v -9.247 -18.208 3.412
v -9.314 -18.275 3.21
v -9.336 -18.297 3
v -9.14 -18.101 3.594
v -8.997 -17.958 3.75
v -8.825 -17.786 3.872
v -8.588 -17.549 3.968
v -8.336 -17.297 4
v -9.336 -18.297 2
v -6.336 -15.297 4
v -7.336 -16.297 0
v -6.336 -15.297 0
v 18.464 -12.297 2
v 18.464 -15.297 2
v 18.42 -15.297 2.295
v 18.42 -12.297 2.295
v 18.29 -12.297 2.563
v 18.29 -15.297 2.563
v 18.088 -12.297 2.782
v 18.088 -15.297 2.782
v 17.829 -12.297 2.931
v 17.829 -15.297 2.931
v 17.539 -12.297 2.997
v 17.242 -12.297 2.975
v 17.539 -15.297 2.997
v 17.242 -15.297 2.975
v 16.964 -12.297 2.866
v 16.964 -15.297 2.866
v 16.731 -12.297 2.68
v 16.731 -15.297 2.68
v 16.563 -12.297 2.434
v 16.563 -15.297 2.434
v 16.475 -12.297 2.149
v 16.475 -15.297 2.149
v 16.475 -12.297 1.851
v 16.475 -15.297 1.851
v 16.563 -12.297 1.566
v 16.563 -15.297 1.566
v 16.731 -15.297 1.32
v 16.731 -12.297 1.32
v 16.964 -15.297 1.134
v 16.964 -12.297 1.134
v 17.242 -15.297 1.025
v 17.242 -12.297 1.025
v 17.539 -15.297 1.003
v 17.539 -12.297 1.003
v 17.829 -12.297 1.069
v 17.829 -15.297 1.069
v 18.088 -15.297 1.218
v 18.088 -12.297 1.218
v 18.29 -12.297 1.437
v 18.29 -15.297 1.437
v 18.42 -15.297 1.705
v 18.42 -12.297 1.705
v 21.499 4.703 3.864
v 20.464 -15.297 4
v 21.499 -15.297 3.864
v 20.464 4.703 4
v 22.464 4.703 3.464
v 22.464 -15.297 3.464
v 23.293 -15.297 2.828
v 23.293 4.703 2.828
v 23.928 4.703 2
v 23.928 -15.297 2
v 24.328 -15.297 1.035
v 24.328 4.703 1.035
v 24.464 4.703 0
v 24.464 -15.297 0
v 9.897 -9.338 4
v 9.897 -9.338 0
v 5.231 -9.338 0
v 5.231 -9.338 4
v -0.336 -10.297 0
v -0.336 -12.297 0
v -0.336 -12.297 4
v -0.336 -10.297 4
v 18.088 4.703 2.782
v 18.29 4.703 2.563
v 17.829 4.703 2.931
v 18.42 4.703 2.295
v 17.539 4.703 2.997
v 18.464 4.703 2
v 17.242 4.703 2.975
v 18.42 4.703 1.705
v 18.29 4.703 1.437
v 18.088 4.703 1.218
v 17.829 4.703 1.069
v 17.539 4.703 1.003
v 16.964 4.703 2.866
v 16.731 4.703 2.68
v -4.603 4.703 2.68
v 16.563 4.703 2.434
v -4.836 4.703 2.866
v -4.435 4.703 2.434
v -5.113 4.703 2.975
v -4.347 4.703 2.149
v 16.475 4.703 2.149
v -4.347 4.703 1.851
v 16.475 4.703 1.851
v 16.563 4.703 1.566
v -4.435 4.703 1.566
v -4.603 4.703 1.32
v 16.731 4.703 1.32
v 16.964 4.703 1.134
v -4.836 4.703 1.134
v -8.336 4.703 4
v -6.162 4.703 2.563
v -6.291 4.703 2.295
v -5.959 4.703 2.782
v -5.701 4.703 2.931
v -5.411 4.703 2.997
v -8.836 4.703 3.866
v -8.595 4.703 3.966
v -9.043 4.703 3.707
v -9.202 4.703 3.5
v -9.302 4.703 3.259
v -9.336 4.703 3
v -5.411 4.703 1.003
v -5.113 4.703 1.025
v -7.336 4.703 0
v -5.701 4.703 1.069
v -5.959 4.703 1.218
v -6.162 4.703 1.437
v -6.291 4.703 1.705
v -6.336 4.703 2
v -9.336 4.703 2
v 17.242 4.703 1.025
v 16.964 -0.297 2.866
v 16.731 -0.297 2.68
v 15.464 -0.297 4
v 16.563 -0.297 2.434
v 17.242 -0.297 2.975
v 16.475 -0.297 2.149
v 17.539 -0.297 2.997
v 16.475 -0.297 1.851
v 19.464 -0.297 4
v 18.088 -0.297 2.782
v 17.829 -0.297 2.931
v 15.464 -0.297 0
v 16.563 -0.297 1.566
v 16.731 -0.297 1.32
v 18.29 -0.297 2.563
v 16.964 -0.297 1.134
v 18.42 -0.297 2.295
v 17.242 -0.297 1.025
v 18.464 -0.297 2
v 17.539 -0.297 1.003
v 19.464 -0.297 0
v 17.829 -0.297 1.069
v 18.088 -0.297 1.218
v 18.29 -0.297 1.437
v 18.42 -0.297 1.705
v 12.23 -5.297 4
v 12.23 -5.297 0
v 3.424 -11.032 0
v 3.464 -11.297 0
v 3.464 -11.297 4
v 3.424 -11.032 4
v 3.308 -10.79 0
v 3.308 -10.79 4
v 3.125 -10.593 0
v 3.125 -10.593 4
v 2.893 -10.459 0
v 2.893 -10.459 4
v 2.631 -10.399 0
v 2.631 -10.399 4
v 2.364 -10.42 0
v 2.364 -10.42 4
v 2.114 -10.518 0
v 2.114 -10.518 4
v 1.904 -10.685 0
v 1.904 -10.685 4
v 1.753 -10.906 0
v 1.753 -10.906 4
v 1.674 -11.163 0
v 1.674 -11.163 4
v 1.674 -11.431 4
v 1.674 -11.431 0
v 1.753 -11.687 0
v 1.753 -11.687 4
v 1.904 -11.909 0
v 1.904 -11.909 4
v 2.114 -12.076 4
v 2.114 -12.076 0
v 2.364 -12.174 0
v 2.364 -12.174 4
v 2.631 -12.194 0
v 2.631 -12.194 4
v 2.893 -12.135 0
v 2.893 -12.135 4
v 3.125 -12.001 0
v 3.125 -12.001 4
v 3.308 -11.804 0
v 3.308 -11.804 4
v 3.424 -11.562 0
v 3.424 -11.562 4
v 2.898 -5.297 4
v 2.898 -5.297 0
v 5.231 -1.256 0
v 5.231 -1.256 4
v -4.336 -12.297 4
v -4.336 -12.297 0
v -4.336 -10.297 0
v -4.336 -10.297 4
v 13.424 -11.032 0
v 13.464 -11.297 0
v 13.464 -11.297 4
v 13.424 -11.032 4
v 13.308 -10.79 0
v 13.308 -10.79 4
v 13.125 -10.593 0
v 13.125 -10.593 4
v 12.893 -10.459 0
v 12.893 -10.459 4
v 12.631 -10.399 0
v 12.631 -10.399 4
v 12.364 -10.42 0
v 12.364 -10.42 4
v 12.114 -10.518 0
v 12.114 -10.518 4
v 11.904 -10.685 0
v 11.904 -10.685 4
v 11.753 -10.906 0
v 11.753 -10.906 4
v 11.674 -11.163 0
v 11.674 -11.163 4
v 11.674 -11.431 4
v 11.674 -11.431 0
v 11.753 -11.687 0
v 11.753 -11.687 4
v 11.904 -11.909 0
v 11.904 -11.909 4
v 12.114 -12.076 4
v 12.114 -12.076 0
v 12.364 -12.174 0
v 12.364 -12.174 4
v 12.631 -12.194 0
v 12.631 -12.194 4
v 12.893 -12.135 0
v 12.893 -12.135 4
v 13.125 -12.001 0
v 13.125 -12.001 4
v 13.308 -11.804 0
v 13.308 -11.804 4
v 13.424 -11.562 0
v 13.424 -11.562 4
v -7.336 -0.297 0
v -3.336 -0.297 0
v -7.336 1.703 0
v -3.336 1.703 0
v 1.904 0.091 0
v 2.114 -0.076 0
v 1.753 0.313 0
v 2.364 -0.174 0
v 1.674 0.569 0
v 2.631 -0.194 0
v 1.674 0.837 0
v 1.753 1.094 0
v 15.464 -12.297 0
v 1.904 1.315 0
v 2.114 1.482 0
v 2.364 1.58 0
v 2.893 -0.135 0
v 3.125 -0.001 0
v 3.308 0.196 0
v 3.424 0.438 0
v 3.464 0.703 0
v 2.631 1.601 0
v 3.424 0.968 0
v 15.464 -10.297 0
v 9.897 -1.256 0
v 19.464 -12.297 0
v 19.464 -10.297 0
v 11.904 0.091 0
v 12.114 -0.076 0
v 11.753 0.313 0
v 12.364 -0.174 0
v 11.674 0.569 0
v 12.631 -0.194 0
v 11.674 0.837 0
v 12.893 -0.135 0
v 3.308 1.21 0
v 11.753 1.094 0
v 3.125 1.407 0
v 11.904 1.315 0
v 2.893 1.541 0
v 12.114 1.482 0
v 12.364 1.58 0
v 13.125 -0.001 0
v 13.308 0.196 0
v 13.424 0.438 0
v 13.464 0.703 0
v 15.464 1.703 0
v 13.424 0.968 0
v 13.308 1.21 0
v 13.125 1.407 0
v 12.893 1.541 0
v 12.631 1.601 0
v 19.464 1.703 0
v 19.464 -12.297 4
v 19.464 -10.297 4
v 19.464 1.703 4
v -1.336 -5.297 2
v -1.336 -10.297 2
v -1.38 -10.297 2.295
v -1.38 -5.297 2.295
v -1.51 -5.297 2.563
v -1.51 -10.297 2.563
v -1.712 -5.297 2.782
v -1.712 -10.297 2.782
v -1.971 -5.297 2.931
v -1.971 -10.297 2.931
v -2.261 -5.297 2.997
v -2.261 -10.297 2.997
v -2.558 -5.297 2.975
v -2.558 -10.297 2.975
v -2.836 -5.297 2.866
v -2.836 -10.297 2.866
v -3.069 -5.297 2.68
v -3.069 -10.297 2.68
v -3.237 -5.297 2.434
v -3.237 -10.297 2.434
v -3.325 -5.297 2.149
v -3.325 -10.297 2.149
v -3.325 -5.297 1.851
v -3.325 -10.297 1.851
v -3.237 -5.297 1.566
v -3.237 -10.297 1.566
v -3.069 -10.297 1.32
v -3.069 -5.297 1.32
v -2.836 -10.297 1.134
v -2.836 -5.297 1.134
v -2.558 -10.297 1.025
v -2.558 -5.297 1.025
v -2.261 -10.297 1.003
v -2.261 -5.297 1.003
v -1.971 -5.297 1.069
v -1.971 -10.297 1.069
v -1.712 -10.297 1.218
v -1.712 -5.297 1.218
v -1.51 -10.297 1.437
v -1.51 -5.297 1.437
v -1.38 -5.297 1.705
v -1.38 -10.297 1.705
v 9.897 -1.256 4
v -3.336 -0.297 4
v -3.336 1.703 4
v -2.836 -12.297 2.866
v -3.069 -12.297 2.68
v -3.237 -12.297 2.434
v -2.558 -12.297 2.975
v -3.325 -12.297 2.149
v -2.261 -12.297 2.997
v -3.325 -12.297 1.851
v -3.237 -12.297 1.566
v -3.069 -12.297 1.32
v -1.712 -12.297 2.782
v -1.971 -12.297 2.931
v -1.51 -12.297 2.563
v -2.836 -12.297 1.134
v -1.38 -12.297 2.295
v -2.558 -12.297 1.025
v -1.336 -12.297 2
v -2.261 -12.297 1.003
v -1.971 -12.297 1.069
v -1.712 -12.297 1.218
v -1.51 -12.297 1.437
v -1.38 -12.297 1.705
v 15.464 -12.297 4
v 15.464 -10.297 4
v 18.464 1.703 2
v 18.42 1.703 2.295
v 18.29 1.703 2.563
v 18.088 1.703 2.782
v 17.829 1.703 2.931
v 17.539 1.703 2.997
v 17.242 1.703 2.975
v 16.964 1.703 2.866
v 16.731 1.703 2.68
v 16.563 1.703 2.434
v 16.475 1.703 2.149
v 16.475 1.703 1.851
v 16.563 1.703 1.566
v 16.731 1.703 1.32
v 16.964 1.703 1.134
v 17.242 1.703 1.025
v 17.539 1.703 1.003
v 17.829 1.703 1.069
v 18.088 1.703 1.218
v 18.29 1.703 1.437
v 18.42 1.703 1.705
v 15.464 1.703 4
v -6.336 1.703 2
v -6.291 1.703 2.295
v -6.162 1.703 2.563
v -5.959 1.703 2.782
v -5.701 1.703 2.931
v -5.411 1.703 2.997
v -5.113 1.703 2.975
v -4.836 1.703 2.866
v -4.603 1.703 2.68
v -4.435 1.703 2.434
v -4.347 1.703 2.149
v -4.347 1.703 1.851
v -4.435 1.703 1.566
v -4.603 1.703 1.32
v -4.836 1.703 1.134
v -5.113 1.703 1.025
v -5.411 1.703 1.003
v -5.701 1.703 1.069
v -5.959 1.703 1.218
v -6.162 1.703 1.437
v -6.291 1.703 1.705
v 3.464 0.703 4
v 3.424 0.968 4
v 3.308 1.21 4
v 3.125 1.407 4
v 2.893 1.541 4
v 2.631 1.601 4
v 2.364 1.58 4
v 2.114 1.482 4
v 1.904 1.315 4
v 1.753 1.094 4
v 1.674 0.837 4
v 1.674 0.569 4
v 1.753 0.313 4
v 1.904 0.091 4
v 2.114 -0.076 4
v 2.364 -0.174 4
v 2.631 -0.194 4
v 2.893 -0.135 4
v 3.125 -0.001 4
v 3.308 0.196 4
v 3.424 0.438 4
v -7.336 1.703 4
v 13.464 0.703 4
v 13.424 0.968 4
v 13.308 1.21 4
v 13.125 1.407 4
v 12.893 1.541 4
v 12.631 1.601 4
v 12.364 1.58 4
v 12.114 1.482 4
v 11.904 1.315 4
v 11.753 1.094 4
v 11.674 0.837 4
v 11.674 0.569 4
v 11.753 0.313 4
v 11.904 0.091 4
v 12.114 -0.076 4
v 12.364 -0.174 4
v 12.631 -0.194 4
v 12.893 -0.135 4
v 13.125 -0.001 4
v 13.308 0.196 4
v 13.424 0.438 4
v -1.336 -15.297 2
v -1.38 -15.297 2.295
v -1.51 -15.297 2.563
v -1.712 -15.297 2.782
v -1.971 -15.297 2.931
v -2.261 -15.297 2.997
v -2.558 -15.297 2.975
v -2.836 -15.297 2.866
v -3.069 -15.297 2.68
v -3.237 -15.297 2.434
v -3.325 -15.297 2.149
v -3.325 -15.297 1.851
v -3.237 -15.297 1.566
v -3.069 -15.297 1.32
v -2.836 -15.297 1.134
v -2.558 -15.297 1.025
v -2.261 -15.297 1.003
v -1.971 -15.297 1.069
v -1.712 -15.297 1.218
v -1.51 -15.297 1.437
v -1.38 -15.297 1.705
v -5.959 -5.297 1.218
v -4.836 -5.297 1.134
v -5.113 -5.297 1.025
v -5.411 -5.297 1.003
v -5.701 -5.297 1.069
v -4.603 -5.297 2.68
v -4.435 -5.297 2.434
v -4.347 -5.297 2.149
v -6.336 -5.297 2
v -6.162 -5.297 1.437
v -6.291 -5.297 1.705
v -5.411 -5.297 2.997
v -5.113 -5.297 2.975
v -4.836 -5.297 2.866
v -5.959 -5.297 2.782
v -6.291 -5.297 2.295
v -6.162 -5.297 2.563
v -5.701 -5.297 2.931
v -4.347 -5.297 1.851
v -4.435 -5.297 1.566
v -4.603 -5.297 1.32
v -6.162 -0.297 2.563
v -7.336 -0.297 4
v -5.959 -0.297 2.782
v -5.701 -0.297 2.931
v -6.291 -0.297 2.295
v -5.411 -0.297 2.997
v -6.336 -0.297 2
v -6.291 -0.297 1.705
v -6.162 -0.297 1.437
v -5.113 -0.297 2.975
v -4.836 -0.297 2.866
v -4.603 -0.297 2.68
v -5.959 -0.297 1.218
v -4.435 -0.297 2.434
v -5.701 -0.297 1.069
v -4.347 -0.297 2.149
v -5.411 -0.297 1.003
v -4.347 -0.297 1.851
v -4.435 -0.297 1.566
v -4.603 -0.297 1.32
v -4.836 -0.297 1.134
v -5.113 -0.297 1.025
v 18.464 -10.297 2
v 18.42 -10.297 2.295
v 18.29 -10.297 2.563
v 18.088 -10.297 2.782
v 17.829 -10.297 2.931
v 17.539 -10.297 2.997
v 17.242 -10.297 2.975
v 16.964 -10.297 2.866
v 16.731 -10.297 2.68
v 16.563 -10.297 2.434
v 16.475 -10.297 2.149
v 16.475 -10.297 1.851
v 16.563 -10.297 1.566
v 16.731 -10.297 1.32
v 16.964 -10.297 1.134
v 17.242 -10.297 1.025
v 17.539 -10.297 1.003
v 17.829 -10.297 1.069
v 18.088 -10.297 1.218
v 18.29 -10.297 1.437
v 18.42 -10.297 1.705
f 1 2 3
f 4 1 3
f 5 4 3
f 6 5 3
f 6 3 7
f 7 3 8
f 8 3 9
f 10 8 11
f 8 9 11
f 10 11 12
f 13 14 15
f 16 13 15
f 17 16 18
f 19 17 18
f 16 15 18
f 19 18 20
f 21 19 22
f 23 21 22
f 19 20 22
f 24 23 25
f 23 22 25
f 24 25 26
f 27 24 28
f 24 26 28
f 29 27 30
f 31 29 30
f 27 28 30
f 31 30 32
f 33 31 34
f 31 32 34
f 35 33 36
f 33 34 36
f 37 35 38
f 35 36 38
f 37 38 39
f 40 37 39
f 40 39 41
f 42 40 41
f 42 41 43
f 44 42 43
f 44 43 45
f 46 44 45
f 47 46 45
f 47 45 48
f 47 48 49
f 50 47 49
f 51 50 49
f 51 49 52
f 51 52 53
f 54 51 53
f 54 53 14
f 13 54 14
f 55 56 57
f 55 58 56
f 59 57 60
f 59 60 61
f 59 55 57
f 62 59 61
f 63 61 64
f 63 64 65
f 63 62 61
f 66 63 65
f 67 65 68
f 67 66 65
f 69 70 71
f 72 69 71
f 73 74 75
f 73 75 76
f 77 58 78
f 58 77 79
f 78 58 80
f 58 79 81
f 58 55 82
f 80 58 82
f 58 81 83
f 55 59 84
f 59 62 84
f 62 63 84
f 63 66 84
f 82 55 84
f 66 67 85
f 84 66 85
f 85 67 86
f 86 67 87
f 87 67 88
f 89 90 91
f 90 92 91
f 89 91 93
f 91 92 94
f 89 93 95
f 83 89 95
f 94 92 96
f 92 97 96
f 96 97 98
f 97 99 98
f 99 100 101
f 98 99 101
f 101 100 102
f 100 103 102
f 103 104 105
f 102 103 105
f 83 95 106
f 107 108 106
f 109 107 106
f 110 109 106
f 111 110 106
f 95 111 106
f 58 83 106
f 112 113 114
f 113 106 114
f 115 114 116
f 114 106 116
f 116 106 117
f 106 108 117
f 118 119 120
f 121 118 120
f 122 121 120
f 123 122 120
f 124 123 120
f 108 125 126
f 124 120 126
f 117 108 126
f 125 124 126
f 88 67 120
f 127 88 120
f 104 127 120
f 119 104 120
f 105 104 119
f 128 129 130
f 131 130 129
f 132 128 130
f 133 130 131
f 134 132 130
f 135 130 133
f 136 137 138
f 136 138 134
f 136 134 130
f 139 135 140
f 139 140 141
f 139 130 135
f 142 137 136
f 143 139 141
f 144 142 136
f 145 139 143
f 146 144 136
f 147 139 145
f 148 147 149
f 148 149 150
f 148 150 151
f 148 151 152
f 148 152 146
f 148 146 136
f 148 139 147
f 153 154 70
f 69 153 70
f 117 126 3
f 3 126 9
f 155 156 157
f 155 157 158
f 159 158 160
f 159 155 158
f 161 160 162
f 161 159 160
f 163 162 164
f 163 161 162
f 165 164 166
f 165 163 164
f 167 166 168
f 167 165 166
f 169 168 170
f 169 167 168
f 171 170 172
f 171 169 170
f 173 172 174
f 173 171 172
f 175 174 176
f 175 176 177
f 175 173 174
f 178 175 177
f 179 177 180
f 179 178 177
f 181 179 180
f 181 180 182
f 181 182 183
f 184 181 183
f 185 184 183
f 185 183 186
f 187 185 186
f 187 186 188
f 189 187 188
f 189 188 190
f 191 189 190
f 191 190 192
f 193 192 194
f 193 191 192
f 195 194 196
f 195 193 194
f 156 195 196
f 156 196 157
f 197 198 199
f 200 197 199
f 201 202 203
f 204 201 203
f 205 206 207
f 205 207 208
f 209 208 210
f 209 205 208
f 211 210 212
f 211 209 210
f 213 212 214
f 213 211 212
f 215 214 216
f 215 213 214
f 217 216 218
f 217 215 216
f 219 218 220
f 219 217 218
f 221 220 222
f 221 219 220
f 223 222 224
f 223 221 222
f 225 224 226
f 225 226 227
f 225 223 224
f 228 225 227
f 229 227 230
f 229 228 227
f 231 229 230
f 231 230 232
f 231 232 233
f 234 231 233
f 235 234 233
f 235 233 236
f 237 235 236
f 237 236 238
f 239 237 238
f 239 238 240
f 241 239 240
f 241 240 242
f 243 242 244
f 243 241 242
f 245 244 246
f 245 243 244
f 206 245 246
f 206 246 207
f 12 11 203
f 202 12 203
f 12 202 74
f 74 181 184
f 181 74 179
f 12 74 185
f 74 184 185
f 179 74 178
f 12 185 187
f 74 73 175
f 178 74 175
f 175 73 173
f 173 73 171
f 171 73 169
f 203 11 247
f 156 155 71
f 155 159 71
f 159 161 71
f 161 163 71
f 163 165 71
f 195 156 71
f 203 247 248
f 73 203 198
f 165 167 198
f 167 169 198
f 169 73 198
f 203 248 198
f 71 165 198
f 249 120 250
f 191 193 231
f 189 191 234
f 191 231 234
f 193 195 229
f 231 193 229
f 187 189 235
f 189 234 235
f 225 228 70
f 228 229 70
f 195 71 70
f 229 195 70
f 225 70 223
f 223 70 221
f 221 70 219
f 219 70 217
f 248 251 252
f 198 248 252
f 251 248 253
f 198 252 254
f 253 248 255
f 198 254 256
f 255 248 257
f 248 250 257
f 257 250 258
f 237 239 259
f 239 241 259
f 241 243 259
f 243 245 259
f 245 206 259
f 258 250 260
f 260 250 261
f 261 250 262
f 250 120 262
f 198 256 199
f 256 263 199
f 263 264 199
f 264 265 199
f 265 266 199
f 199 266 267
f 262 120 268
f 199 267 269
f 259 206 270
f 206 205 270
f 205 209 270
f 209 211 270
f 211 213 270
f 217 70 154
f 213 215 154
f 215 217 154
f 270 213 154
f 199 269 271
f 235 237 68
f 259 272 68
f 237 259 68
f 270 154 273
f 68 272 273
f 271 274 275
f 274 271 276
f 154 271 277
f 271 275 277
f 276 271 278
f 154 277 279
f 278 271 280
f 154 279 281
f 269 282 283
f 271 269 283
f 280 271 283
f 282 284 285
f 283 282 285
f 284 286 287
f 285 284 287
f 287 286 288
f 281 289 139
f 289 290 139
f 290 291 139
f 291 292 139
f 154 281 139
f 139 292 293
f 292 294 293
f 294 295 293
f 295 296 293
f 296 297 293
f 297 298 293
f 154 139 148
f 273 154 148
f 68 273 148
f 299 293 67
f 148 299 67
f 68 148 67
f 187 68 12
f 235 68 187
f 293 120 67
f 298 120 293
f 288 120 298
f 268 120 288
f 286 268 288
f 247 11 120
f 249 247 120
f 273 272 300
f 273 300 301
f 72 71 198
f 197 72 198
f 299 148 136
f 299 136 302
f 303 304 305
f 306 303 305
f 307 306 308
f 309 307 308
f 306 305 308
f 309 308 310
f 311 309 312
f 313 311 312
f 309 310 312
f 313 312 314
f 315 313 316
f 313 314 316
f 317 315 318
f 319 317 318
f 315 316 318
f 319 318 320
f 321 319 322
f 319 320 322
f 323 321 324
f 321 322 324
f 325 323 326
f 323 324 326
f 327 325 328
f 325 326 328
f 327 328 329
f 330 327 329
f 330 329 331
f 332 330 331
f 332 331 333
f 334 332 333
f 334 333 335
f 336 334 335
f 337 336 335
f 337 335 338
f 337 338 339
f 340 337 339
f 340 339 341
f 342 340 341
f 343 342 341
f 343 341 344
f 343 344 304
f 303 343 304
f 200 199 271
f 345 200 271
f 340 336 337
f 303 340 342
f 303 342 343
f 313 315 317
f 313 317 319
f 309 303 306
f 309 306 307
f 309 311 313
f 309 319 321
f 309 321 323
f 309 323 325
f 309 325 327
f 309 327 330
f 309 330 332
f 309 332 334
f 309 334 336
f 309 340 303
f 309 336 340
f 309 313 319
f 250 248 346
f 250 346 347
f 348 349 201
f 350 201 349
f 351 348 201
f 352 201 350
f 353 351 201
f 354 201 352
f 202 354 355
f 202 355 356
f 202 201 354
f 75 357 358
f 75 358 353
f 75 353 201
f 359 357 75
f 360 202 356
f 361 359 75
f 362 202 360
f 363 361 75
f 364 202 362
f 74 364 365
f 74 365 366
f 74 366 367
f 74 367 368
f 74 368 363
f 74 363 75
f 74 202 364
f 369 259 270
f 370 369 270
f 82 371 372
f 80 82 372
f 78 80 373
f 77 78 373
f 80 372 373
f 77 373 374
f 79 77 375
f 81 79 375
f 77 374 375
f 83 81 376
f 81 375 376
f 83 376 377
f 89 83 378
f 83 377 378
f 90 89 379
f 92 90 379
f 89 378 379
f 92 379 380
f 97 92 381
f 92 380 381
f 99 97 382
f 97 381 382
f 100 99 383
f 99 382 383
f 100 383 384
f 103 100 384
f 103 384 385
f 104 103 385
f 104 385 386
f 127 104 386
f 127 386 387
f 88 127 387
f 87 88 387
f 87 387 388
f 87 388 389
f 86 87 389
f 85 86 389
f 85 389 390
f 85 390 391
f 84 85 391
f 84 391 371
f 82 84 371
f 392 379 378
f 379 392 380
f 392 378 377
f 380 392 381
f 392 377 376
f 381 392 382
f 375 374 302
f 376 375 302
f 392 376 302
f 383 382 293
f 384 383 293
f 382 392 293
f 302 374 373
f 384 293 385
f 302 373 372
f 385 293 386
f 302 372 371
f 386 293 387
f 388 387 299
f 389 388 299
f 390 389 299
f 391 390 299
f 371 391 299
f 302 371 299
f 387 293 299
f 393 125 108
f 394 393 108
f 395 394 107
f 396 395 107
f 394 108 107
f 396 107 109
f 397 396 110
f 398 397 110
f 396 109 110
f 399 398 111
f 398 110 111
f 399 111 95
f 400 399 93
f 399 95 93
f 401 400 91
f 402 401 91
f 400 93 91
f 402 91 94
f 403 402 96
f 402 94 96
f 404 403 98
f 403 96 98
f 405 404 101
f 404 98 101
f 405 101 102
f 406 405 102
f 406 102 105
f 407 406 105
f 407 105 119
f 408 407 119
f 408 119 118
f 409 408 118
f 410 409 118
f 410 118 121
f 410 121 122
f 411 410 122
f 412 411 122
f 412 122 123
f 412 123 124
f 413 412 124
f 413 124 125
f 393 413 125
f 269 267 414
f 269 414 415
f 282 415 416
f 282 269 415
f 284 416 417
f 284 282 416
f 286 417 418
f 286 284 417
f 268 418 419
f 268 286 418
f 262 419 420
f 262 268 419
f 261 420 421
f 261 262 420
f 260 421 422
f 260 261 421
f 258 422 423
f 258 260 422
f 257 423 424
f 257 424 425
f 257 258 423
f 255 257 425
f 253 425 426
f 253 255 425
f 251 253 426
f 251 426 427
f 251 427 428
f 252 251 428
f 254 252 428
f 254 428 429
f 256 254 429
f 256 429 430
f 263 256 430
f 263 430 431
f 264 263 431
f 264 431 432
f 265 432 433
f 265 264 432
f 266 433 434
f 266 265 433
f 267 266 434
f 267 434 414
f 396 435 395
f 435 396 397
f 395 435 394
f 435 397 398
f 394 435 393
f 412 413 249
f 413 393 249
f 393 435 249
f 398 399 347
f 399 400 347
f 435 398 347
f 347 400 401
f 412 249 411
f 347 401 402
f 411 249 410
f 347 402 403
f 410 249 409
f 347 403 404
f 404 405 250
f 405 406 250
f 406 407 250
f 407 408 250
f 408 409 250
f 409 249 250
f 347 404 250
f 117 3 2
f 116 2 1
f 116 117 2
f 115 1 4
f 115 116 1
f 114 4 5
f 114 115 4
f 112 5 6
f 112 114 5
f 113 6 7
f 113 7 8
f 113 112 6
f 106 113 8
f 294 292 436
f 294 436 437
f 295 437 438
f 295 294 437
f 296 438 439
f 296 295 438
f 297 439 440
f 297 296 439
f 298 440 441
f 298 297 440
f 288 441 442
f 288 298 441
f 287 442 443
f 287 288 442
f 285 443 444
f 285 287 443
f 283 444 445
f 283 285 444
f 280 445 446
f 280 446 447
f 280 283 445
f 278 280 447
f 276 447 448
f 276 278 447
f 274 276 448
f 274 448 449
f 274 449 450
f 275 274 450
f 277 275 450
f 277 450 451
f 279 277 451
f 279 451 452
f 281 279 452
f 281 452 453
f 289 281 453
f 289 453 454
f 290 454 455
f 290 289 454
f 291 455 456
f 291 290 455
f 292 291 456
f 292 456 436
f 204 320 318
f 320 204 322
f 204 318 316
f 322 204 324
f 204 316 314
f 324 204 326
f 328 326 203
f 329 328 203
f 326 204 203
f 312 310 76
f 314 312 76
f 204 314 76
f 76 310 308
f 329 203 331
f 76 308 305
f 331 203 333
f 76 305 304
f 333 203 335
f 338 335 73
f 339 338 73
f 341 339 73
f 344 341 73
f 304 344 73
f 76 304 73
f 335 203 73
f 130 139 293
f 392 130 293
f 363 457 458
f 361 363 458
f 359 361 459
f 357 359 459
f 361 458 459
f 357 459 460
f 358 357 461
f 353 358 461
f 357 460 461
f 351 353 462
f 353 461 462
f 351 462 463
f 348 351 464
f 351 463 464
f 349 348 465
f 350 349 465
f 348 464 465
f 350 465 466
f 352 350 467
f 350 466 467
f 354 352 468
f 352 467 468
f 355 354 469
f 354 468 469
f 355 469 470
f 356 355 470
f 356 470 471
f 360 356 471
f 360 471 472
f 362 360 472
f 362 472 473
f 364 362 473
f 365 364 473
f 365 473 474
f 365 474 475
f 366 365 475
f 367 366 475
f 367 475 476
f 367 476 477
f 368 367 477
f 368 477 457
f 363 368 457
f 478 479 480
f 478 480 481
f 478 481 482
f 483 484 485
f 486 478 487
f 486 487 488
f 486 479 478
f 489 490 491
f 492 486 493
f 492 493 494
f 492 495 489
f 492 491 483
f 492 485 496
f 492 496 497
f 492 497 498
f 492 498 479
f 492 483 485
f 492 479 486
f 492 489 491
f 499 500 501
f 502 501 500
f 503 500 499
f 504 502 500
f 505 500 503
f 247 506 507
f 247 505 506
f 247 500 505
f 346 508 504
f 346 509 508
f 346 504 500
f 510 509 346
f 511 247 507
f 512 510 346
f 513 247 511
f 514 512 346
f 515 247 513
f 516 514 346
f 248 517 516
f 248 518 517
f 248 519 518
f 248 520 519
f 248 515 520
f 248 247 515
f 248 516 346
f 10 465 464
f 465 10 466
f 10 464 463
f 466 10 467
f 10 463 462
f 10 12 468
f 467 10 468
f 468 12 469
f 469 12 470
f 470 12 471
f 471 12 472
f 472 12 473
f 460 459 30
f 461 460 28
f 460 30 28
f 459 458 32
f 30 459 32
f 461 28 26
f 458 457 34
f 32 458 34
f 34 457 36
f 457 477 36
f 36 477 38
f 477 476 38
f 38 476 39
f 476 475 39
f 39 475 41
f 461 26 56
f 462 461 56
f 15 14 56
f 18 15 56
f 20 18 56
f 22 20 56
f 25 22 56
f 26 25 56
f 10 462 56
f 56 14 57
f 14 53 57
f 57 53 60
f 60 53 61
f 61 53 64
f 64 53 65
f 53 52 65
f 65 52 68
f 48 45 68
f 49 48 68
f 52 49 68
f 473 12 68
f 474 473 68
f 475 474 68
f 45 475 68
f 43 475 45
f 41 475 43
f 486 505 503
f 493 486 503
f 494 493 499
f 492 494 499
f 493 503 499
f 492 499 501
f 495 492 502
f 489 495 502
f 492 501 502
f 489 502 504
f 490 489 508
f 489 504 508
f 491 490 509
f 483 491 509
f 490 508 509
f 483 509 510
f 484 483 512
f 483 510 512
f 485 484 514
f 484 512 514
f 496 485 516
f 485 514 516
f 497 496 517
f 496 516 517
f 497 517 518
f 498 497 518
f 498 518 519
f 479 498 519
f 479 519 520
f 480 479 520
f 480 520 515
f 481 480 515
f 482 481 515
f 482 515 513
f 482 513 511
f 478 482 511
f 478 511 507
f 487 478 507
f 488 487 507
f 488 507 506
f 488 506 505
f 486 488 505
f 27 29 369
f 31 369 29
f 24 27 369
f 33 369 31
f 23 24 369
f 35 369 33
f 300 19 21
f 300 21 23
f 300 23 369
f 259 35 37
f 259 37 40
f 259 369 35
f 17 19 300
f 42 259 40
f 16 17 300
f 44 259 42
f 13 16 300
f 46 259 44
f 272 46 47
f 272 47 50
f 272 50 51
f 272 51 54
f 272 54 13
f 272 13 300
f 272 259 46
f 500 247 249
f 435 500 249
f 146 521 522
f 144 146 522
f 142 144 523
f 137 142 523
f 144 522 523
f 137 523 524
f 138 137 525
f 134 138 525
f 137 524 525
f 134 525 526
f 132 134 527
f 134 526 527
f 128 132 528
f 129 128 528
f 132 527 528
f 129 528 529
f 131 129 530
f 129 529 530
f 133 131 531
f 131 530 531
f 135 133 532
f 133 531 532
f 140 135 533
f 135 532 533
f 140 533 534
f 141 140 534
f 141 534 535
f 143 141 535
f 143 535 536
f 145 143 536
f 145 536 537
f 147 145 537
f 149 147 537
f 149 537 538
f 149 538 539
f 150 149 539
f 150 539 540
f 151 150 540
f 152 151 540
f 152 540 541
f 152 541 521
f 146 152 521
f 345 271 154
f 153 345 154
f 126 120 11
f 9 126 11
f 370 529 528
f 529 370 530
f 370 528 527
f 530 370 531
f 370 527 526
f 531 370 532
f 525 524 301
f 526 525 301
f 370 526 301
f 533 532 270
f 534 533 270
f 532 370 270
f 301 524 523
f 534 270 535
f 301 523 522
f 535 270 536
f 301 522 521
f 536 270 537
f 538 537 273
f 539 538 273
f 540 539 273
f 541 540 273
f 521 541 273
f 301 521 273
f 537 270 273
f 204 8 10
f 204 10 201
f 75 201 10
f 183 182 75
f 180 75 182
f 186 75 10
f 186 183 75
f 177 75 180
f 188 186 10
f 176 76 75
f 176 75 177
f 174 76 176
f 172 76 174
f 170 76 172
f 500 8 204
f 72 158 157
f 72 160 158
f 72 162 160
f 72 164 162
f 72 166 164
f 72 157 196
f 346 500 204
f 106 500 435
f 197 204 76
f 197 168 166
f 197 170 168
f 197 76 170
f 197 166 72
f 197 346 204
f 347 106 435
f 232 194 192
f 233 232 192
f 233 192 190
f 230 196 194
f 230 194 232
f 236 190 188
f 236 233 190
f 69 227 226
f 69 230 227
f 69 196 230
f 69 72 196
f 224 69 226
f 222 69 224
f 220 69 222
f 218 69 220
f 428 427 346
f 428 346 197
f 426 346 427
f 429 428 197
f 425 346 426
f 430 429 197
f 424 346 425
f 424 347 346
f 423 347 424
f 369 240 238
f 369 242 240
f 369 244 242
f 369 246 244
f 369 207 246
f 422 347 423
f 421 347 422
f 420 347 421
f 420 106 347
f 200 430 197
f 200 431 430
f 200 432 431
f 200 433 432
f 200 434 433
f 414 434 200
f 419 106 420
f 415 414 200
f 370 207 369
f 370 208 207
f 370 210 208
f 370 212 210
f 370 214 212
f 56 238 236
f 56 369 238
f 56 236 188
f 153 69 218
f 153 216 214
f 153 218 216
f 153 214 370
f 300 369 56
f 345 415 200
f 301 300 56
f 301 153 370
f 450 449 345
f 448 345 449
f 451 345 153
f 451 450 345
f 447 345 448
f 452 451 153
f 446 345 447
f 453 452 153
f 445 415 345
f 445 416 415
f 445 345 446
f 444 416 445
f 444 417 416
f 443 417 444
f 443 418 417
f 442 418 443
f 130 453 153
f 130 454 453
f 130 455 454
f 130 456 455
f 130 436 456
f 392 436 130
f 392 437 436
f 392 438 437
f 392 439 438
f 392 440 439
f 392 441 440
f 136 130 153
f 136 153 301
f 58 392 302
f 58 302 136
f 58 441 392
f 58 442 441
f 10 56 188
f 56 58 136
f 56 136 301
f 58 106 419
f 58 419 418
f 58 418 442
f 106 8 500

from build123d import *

# Parameters (mm, degrees)
SKETCH1_W           = 4
SKETCH1_H           = 2
SKETCH1_R           = 0.9
BOSS_EXTRUDE1_DEPTH = 4
SKETCH3_R           = 1
CUT_EXTRUDE1_DEPTH  = 20
SKETCH3_3_R         = 1
CUT_EXTRUDE2_DEPTH  = 10
SKETCH5_R           = 1
CUT_EXTRUDE3_DEPTH  = 10
CHAMFER2_SIZE       = 2
FILLET2_R           = 1
FILLET3_R           = 4


with BuildPart() as part:
    # Sketch1 → Boss-Extrude1 (new body)
    # profile 1 of 2: a face of its own
    with BuildSketch(Plane.XY):
        Polygon((-9.335901083, -15.296943817), (-6.335901083, -15.296943817), (24.464098917, -15.296943817), (24.464098917, 4.703056183), (-9.335901083, 4.703056183), align=None)
        with Locations((-2.335901083, -11.296943817)):
            Rectangle(SKETCH1_W, SKETCH1_H, mode=Mode.SUBTRACT)
        with Locations((2.564098917, -11.296943817)):
            Circle(SKETCH1_R, mode=Mode.SUBTRACT)
        with Locations((12.564098917, -11.296943817)):
            Circle(SKETCH1_R, mode=Mode.SUBTRACT)
        with Locations((17.464098917, -11.296943817)):
            Rectangle(SKETCH1_W, SKETCH1_H, mode=Mode.SUBTRACT)
        with Locations((-5.335901083, 0.703056183)):
            Rectangle(SKETCH1_W, SKETCH1_H, mode=Mode.SUBTRACT)
        with Locations((2.564098917, 0.703056183)):
            Circle(SKETCH1_R, mode=Mode.SUBTRACT)
        Polygon((9.896924586, -1.256371234), (12.229750255, -5.296943817), (9.896924586, -9.337516401), (5.231273248, -9.337516401), (2.898447579, -5.296943817), (5.231273248, -1.256371234), align=None, mode=Mode.SUBTRACT)
        with Locations((12.564098917, 0.703056183)):
            Circle(SKETCH1_R, mode=Mode.SUBTRACT)
        with Locations((17.464098917, 0.703056183)):
            Rectangle(SKETCH1_W, SKETCH1_H, mode=Mode.SUBTRACT)
    # profile 2 of 2: a face of its own
    with BuildSketch(Plane.XY):
        Polygon((-9.335901083, -15.296943817), (-9.335901083, -18.296943817), (-6.335901083, -15.296943817), align=None)
    extrude(amount=BOSS_EXTRUDE1_DEPTH)

    # Sketch3 → Cut-Extrude1 (cut)
    with BuildSketch(Plane.XZ.offset(15.296943817)):
        with Locations((17.464098917, 2)):
            Circle(SKETCH3_R)
    extrude(amount=-CUT_EXTRUDE1_DEPTH, mode=Mode.SUBTRACT)

    # Sketch3<3> → Cut-Extrude2 (cut)
    with BuildSketch(Plane.XZ.offset(15.296943817)):
        with Locations((-2.335901083, 2)):
            Circle(SKETCH3_3_R)
    extrude(amount=-CUT_EXTRUDE2_DEPTH, mode=Mode.SUBTRACT)

    # Sketch5 → Cut-Extrude3 (cut)
    with BuildSketch(Plane(origin=(0, 4.703056183, 0), x_dir=(1, 0, 0), z_dir=(0, 1, 0))):
        with Locations(Location((-5.335901083, -2, 0), (0, 0, 180))):
            Circle(SKETCH5_R)
    extrude(amount=-CUT_EXTRUDE3_DEPTH, mode=Mode.SUBTRACT)

    # Chamfer2
    chamfer2_edges = [part.edges().sort_by_distance(p)[0] for p in [
        (-9.335901083, -6.796943817, 0),
    ]]
    chamfer(chamfer2_edges, length=CHAMFER2_SIZE - 0.0001)  # a hair under: the kernel refuses the full size

    # Fillet2
    fillet2_edges = [part.edges().sort_by_distance(p)[0] for p in [
        (-9.335901083, -6.796943817, 4),
    ]]
    fillet(fillet2_edges, radius=FILLET2_R)

    # Fillet3
    fillet3_edges = [part.edges().sort_by_distance(p)[0] for p in [
        (24.464098917, -5.296943817, 4),
    ]]
    fillet(fillet3_edges, radius=FILLET3_R - 0.0001)  # a hair under: the kernel refuses the full size


solid = part.part
